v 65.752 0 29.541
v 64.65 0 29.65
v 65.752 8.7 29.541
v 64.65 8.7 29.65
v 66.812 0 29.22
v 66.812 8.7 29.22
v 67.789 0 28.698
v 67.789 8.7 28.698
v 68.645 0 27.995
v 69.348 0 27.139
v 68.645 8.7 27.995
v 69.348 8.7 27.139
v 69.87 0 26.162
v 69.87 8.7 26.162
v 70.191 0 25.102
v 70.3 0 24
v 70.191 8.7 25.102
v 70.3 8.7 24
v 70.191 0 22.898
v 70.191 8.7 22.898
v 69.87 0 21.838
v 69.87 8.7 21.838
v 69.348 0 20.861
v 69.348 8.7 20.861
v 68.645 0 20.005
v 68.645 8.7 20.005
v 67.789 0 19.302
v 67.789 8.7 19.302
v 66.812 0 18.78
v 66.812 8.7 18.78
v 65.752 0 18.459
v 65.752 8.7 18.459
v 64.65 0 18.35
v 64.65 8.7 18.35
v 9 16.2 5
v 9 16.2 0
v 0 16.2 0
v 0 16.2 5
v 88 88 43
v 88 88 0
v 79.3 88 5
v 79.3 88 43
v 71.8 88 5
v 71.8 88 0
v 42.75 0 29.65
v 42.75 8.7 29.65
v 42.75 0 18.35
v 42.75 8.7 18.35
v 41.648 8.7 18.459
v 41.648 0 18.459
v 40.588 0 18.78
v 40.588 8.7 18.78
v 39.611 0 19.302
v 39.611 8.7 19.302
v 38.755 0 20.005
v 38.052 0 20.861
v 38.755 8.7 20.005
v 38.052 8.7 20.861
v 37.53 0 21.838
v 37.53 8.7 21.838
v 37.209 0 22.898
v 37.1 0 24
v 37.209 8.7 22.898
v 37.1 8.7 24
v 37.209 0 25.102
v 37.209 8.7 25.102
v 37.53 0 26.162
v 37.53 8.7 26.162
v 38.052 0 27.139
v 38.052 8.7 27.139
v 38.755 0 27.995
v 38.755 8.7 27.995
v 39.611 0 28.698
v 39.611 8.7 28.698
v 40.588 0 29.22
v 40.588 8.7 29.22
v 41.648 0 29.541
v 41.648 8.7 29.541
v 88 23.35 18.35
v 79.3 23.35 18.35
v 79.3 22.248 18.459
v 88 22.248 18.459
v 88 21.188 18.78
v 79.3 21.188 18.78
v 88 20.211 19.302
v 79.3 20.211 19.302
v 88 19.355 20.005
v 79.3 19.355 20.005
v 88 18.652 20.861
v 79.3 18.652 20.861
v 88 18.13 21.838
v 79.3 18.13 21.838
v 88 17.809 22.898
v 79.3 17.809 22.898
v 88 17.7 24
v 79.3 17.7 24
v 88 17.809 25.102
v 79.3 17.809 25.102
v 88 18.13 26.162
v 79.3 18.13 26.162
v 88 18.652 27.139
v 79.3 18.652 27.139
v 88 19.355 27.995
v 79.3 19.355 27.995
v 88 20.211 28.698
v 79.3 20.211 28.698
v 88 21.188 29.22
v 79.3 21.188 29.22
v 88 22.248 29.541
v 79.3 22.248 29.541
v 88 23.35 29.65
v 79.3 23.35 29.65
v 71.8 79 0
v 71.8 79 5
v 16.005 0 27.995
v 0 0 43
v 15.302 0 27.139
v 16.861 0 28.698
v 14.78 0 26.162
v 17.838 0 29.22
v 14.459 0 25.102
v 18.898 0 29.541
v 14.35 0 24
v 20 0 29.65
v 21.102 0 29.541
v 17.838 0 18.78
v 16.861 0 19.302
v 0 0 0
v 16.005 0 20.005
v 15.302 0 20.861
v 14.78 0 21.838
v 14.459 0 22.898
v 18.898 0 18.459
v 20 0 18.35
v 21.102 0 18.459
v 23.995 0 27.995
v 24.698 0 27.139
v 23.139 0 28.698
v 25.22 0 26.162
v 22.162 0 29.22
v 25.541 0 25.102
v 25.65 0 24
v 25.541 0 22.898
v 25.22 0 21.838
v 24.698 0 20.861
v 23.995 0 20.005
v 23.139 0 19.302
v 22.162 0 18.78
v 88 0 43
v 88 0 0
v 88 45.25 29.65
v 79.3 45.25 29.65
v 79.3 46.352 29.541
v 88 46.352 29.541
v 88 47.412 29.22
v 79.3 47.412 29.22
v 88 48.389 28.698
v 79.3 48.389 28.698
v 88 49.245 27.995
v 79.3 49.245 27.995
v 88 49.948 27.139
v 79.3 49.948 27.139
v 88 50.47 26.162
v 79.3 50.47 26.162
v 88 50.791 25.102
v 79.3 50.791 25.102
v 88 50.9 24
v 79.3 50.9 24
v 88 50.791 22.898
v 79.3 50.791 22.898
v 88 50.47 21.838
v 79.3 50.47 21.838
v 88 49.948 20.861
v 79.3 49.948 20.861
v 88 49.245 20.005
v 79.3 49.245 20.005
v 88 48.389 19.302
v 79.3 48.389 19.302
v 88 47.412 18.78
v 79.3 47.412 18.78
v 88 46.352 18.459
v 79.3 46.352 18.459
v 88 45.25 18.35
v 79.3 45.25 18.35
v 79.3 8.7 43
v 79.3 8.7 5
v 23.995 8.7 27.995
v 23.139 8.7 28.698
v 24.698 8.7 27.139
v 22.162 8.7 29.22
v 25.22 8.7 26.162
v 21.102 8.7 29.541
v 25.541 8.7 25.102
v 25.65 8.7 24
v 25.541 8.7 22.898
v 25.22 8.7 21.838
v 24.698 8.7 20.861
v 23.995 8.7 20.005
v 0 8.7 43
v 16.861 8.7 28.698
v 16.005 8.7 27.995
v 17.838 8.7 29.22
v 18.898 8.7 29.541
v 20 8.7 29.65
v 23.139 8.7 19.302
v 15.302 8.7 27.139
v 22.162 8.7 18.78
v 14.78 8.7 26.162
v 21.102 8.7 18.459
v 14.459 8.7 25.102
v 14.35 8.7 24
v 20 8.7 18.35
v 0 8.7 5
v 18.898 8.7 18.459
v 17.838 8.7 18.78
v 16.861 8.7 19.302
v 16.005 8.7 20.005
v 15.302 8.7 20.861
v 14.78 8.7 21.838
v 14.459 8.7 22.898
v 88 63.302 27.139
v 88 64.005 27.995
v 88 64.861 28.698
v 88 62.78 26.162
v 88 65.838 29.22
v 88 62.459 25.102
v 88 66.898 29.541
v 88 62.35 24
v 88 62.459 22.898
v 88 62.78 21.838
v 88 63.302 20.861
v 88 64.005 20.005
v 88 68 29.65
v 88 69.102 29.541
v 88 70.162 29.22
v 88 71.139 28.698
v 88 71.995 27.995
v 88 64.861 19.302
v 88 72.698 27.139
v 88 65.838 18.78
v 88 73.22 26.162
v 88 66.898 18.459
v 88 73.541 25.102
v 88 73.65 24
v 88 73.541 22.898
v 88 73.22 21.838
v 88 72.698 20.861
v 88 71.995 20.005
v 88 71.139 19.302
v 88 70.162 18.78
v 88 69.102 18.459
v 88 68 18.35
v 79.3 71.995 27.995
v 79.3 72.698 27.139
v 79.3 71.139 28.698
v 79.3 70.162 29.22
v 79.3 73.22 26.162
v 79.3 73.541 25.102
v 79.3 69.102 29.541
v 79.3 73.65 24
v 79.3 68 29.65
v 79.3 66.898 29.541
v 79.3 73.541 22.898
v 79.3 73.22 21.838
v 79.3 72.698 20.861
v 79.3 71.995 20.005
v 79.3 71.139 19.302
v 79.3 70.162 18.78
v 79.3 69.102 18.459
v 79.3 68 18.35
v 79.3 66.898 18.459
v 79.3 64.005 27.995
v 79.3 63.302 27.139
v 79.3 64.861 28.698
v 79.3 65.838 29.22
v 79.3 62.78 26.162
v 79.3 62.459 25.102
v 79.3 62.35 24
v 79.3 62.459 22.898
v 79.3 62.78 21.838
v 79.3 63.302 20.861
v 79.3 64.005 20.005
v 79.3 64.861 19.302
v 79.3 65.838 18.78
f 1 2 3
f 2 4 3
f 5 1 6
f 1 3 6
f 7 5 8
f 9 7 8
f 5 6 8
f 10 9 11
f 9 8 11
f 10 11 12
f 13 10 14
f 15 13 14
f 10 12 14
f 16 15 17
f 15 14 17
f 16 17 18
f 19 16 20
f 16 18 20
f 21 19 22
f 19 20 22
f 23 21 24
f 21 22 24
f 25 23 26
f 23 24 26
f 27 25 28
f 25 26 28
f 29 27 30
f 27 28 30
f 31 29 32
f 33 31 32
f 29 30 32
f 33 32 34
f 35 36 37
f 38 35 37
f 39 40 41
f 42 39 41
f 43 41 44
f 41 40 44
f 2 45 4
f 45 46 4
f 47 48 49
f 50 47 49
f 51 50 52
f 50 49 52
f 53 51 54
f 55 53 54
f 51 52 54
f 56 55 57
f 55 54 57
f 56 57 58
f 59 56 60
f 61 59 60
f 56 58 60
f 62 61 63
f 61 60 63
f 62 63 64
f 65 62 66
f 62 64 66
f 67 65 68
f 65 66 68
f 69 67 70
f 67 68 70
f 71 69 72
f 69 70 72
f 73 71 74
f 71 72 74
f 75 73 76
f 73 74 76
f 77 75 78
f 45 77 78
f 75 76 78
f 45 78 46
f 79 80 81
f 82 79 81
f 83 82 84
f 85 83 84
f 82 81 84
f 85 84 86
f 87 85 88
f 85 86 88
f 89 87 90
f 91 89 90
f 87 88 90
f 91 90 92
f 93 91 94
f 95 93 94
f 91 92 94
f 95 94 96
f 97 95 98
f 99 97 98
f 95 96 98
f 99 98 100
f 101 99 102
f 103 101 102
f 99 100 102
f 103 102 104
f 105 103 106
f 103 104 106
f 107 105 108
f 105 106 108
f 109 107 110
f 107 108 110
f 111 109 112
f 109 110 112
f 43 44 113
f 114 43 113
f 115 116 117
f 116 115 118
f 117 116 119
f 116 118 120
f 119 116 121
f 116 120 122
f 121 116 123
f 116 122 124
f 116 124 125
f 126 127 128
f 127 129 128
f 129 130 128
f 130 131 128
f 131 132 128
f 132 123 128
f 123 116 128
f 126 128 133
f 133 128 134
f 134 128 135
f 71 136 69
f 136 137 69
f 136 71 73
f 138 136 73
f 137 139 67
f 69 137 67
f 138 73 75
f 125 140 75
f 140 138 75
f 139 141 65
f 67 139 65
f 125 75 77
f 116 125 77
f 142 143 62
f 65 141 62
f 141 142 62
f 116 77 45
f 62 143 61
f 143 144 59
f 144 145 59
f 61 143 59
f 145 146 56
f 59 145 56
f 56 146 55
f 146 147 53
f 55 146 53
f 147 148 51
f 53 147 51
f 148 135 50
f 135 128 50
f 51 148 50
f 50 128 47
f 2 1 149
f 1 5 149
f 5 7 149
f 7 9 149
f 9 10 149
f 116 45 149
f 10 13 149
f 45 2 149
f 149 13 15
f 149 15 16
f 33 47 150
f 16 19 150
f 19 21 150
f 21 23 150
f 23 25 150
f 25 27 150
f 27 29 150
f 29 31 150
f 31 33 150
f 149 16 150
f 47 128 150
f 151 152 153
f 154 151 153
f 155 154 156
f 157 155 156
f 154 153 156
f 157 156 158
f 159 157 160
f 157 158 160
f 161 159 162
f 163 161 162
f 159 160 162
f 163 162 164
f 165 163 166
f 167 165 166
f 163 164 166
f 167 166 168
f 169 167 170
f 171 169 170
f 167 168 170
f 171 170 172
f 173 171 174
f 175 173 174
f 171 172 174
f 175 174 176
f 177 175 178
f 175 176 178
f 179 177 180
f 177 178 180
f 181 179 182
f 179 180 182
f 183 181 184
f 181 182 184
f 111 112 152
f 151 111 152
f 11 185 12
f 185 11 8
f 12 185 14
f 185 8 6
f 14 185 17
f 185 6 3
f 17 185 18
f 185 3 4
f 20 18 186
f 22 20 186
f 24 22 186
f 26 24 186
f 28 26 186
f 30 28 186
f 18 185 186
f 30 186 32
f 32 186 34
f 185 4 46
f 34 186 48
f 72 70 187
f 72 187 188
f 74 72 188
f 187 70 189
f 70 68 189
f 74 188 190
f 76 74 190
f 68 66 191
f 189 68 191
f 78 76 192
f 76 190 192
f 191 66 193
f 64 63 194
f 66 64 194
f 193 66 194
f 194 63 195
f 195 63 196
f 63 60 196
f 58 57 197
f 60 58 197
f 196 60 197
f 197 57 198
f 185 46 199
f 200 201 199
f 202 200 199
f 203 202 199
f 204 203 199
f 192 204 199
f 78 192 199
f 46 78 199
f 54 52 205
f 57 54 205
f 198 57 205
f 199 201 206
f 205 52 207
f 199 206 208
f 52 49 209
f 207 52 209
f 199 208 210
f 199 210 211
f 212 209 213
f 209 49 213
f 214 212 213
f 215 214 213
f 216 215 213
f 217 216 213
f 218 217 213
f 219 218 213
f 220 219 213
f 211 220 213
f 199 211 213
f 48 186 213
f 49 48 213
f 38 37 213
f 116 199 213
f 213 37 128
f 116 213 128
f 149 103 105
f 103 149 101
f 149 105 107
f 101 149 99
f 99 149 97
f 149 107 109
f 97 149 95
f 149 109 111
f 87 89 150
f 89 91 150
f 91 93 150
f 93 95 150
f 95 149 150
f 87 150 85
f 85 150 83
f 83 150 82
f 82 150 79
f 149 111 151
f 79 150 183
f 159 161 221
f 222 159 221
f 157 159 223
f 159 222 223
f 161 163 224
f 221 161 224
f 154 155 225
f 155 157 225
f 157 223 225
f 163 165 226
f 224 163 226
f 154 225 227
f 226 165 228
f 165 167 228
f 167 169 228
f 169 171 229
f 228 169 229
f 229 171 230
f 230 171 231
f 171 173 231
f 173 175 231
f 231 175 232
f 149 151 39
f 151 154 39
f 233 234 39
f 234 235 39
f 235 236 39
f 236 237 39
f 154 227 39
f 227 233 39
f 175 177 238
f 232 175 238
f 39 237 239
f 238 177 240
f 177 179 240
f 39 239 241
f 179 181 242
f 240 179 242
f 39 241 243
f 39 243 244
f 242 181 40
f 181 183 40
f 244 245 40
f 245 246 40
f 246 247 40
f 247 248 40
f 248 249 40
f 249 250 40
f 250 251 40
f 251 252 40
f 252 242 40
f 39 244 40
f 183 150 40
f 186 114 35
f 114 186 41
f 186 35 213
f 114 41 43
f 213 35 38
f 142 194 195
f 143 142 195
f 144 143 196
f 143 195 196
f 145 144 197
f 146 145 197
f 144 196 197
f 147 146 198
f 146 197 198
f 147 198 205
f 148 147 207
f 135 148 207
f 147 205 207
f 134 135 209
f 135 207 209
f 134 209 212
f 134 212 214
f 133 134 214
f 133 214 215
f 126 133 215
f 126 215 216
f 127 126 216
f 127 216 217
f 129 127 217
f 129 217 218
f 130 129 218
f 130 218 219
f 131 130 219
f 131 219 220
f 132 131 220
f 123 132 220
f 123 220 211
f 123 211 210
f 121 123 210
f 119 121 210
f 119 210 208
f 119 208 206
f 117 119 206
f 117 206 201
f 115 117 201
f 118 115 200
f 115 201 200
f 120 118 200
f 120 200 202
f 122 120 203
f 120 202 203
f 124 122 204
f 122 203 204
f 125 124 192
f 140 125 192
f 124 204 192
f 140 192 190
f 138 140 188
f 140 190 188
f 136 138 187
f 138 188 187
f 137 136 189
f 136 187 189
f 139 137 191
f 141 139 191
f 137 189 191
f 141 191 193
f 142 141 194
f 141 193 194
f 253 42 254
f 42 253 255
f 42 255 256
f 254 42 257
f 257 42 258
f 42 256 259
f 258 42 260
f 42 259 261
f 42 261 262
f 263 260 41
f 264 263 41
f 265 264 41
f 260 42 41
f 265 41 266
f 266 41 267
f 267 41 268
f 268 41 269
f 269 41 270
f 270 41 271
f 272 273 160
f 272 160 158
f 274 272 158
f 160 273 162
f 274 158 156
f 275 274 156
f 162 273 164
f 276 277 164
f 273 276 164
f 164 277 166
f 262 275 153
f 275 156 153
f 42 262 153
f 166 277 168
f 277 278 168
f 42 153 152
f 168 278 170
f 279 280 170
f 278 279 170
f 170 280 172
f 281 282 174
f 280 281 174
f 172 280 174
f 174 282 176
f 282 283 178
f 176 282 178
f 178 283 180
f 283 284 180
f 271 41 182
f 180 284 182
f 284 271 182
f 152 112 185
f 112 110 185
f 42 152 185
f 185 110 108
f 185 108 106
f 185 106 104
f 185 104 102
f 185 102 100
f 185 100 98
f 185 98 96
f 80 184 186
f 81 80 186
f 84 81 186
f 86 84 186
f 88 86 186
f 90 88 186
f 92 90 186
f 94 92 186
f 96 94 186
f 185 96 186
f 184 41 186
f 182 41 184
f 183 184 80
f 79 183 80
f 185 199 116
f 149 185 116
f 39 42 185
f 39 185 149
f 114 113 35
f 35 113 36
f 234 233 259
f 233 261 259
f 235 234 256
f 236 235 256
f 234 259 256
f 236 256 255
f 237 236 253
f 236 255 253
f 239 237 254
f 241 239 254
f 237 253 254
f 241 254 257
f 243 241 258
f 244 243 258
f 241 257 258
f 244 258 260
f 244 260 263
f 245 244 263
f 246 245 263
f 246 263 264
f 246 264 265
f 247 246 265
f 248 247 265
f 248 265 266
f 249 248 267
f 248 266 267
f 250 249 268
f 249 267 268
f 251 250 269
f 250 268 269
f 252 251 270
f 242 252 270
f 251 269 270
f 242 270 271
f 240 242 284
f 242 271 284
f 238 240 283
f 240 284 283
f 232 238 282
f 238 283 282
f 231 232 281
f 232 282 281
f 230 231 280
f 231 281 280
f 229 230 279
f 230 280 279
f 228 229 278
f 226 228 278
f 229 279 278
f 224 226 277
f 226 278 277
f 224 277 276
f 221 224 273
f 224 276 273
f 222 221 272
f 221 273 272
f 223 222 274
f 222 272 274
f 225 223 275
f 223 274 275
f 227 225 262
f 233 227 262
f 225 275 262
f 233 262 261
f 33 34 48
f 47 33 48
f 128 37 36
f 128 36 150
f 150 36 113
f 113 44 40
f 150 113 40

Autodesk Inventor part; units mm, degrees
ref_plane "YZ Plane" through (0, 0, 0) normal (1, 0, 0) x (0, 1, 0)
ref_plane "XZ Plane" through (0, 0, 0) normal (0, 1, 0) x (-1, 0, 0)
ref_plane "XY Plane" through (0, 0, 0) normal (0, 0, 1) x (1, 0, 0)
sketch "Boceto1" plane through (0, 0, 0) normal (0, 0, 1) x (1, 0, 0)
  line L0 (0, 0) -> (88, 0)
  line L1 (88, 0) -> (88, 88)
  line L2 (88, 88) -> (79.3, 88)
  line L3 (79.3, 88) -> (79.3, 8.7)
  line L4 (79.3, 8.7) -> (0, 8.7)
  line L5 (0, 8.7) -> (0, 0)
  dimension "d0" = 8.7
  dimension "d1" = 8.7
  dimension "d2" = 88
  dimension "d3" = 88
extrude "Extrusión1" add sketch "Boceto1" along normal blind 43
sketch "Boceto2" plane through (0, 0, 0) normal (0, 0, -1) x (-1, 0, 0)
  line L0 (-88, 88) -> (-79.3, 88) projected
  line L1 (-79.3, 88) -> (-71.8, 88)
  line L2 (-71.8, 88) -> (-71.8, 79)
  line L3 (-71.8, 79) -> (-9, 16.2)
  line L4 (-9, 16.2) -> (0, 16.2)
  line L5 (-79.3, 88) -> (-79.3, 8.7) projected
  line L6 (-79.3, 8.7) -> (0, 8.7) projected
  line L7 (0, 8.7) -> (0, 16.2)
  point P0 (0, 0)
  dimension "d6" = 7.5
  dimension "d7" = 7.5
  dimension "d8" = 9
  dimension "d9" = 9
extrude "Extrusión2" add sketch "Boceto2" against normal blind 5
sketch "Boceto3" plane through (79.3, 8.7, 43) normal (-1, 0, 0) x (0, 0, 1)
  line L0 (-19, 36.55) -> (-19, 14.65) construction
  line L1 (-24.65, 36.55) -> (-24.65, 14.65)
  line L2 (-13.35, 14.65) -> (-13.35, 36.55)
  arc A0 (-13.35, 36.55) -> (-24.65, 36.55) centre (-19, 36.55) ccw
  arc A1 (-24.65, 14.65) -> (-13.35, 14.65) centre (-19, 14.65) ccw
  circle A2 centre (-19, 59.3) radius 5.65
  line L3 (-38, 79.3) -> (0, 79.3) projected
  line L4 (-38, 0) -> (0, 0) projected
  point P0 (-43, -8.7)
  point P1 (-19, 25.6)
  point P2 (-19, 79.3)
  point P3 (-19, 9)
  point P4 (-19, 42.2)
  dimension "d12" = 11.3
  dimension "d13" = 20
  dimension "d14" = 11.3
  dimension "d15" = 33.2
  dimension "d16" = 9
extrude "Extrusión3" cut sketch "Boceto3" against normal through all
sketch "Boceto4" plane through (0, 8.7, 43) normal (0, 1, 0) x (1, 0, 0)
  circle A0 centre (20, 19) radius 5.65
  line L0 (64.65, 19) -> (42.75, 19) construction
  line L1 (64.65, 24.65) -> (42.75, 24.65)
  line L2 (42.75, 13.35) -> (64.65, 13.35)
  arc A1 (64.65, 13.35) -> (64.65, 24.65) centre (64.65, 19) ccw
  arc A2 (42.75, 24.65) -> (42.75, 13.35) centre (42.75, 19) ccw
  line L3 (0, 38) -> (0, 0) projected
  line L4 (79.3, 38) -> (79.3, 0) projected
  point P0 (0, 43)
  point P1 (53.7, 19)
  point P2 (0, 19)
  point P3 (70.3, 19)
  point P4 (37.1, 19)
  dimension "d19" = 11.3
  dimension "d20" = 11.3
  dimension "d21" = 9
  dimension "d22" = 33.2
  dimension "d23" = 20
extrude "Extrusión4" cut sketch "Boceto4" against normal through all
equation "\"d1\" = d0"
equation "\"d3\" = d2"
equation "\"d7\" = d6"
equation "\"d14\" = d12"
equation "\"d20\" = d19"
properties part number "escuadra grande"
